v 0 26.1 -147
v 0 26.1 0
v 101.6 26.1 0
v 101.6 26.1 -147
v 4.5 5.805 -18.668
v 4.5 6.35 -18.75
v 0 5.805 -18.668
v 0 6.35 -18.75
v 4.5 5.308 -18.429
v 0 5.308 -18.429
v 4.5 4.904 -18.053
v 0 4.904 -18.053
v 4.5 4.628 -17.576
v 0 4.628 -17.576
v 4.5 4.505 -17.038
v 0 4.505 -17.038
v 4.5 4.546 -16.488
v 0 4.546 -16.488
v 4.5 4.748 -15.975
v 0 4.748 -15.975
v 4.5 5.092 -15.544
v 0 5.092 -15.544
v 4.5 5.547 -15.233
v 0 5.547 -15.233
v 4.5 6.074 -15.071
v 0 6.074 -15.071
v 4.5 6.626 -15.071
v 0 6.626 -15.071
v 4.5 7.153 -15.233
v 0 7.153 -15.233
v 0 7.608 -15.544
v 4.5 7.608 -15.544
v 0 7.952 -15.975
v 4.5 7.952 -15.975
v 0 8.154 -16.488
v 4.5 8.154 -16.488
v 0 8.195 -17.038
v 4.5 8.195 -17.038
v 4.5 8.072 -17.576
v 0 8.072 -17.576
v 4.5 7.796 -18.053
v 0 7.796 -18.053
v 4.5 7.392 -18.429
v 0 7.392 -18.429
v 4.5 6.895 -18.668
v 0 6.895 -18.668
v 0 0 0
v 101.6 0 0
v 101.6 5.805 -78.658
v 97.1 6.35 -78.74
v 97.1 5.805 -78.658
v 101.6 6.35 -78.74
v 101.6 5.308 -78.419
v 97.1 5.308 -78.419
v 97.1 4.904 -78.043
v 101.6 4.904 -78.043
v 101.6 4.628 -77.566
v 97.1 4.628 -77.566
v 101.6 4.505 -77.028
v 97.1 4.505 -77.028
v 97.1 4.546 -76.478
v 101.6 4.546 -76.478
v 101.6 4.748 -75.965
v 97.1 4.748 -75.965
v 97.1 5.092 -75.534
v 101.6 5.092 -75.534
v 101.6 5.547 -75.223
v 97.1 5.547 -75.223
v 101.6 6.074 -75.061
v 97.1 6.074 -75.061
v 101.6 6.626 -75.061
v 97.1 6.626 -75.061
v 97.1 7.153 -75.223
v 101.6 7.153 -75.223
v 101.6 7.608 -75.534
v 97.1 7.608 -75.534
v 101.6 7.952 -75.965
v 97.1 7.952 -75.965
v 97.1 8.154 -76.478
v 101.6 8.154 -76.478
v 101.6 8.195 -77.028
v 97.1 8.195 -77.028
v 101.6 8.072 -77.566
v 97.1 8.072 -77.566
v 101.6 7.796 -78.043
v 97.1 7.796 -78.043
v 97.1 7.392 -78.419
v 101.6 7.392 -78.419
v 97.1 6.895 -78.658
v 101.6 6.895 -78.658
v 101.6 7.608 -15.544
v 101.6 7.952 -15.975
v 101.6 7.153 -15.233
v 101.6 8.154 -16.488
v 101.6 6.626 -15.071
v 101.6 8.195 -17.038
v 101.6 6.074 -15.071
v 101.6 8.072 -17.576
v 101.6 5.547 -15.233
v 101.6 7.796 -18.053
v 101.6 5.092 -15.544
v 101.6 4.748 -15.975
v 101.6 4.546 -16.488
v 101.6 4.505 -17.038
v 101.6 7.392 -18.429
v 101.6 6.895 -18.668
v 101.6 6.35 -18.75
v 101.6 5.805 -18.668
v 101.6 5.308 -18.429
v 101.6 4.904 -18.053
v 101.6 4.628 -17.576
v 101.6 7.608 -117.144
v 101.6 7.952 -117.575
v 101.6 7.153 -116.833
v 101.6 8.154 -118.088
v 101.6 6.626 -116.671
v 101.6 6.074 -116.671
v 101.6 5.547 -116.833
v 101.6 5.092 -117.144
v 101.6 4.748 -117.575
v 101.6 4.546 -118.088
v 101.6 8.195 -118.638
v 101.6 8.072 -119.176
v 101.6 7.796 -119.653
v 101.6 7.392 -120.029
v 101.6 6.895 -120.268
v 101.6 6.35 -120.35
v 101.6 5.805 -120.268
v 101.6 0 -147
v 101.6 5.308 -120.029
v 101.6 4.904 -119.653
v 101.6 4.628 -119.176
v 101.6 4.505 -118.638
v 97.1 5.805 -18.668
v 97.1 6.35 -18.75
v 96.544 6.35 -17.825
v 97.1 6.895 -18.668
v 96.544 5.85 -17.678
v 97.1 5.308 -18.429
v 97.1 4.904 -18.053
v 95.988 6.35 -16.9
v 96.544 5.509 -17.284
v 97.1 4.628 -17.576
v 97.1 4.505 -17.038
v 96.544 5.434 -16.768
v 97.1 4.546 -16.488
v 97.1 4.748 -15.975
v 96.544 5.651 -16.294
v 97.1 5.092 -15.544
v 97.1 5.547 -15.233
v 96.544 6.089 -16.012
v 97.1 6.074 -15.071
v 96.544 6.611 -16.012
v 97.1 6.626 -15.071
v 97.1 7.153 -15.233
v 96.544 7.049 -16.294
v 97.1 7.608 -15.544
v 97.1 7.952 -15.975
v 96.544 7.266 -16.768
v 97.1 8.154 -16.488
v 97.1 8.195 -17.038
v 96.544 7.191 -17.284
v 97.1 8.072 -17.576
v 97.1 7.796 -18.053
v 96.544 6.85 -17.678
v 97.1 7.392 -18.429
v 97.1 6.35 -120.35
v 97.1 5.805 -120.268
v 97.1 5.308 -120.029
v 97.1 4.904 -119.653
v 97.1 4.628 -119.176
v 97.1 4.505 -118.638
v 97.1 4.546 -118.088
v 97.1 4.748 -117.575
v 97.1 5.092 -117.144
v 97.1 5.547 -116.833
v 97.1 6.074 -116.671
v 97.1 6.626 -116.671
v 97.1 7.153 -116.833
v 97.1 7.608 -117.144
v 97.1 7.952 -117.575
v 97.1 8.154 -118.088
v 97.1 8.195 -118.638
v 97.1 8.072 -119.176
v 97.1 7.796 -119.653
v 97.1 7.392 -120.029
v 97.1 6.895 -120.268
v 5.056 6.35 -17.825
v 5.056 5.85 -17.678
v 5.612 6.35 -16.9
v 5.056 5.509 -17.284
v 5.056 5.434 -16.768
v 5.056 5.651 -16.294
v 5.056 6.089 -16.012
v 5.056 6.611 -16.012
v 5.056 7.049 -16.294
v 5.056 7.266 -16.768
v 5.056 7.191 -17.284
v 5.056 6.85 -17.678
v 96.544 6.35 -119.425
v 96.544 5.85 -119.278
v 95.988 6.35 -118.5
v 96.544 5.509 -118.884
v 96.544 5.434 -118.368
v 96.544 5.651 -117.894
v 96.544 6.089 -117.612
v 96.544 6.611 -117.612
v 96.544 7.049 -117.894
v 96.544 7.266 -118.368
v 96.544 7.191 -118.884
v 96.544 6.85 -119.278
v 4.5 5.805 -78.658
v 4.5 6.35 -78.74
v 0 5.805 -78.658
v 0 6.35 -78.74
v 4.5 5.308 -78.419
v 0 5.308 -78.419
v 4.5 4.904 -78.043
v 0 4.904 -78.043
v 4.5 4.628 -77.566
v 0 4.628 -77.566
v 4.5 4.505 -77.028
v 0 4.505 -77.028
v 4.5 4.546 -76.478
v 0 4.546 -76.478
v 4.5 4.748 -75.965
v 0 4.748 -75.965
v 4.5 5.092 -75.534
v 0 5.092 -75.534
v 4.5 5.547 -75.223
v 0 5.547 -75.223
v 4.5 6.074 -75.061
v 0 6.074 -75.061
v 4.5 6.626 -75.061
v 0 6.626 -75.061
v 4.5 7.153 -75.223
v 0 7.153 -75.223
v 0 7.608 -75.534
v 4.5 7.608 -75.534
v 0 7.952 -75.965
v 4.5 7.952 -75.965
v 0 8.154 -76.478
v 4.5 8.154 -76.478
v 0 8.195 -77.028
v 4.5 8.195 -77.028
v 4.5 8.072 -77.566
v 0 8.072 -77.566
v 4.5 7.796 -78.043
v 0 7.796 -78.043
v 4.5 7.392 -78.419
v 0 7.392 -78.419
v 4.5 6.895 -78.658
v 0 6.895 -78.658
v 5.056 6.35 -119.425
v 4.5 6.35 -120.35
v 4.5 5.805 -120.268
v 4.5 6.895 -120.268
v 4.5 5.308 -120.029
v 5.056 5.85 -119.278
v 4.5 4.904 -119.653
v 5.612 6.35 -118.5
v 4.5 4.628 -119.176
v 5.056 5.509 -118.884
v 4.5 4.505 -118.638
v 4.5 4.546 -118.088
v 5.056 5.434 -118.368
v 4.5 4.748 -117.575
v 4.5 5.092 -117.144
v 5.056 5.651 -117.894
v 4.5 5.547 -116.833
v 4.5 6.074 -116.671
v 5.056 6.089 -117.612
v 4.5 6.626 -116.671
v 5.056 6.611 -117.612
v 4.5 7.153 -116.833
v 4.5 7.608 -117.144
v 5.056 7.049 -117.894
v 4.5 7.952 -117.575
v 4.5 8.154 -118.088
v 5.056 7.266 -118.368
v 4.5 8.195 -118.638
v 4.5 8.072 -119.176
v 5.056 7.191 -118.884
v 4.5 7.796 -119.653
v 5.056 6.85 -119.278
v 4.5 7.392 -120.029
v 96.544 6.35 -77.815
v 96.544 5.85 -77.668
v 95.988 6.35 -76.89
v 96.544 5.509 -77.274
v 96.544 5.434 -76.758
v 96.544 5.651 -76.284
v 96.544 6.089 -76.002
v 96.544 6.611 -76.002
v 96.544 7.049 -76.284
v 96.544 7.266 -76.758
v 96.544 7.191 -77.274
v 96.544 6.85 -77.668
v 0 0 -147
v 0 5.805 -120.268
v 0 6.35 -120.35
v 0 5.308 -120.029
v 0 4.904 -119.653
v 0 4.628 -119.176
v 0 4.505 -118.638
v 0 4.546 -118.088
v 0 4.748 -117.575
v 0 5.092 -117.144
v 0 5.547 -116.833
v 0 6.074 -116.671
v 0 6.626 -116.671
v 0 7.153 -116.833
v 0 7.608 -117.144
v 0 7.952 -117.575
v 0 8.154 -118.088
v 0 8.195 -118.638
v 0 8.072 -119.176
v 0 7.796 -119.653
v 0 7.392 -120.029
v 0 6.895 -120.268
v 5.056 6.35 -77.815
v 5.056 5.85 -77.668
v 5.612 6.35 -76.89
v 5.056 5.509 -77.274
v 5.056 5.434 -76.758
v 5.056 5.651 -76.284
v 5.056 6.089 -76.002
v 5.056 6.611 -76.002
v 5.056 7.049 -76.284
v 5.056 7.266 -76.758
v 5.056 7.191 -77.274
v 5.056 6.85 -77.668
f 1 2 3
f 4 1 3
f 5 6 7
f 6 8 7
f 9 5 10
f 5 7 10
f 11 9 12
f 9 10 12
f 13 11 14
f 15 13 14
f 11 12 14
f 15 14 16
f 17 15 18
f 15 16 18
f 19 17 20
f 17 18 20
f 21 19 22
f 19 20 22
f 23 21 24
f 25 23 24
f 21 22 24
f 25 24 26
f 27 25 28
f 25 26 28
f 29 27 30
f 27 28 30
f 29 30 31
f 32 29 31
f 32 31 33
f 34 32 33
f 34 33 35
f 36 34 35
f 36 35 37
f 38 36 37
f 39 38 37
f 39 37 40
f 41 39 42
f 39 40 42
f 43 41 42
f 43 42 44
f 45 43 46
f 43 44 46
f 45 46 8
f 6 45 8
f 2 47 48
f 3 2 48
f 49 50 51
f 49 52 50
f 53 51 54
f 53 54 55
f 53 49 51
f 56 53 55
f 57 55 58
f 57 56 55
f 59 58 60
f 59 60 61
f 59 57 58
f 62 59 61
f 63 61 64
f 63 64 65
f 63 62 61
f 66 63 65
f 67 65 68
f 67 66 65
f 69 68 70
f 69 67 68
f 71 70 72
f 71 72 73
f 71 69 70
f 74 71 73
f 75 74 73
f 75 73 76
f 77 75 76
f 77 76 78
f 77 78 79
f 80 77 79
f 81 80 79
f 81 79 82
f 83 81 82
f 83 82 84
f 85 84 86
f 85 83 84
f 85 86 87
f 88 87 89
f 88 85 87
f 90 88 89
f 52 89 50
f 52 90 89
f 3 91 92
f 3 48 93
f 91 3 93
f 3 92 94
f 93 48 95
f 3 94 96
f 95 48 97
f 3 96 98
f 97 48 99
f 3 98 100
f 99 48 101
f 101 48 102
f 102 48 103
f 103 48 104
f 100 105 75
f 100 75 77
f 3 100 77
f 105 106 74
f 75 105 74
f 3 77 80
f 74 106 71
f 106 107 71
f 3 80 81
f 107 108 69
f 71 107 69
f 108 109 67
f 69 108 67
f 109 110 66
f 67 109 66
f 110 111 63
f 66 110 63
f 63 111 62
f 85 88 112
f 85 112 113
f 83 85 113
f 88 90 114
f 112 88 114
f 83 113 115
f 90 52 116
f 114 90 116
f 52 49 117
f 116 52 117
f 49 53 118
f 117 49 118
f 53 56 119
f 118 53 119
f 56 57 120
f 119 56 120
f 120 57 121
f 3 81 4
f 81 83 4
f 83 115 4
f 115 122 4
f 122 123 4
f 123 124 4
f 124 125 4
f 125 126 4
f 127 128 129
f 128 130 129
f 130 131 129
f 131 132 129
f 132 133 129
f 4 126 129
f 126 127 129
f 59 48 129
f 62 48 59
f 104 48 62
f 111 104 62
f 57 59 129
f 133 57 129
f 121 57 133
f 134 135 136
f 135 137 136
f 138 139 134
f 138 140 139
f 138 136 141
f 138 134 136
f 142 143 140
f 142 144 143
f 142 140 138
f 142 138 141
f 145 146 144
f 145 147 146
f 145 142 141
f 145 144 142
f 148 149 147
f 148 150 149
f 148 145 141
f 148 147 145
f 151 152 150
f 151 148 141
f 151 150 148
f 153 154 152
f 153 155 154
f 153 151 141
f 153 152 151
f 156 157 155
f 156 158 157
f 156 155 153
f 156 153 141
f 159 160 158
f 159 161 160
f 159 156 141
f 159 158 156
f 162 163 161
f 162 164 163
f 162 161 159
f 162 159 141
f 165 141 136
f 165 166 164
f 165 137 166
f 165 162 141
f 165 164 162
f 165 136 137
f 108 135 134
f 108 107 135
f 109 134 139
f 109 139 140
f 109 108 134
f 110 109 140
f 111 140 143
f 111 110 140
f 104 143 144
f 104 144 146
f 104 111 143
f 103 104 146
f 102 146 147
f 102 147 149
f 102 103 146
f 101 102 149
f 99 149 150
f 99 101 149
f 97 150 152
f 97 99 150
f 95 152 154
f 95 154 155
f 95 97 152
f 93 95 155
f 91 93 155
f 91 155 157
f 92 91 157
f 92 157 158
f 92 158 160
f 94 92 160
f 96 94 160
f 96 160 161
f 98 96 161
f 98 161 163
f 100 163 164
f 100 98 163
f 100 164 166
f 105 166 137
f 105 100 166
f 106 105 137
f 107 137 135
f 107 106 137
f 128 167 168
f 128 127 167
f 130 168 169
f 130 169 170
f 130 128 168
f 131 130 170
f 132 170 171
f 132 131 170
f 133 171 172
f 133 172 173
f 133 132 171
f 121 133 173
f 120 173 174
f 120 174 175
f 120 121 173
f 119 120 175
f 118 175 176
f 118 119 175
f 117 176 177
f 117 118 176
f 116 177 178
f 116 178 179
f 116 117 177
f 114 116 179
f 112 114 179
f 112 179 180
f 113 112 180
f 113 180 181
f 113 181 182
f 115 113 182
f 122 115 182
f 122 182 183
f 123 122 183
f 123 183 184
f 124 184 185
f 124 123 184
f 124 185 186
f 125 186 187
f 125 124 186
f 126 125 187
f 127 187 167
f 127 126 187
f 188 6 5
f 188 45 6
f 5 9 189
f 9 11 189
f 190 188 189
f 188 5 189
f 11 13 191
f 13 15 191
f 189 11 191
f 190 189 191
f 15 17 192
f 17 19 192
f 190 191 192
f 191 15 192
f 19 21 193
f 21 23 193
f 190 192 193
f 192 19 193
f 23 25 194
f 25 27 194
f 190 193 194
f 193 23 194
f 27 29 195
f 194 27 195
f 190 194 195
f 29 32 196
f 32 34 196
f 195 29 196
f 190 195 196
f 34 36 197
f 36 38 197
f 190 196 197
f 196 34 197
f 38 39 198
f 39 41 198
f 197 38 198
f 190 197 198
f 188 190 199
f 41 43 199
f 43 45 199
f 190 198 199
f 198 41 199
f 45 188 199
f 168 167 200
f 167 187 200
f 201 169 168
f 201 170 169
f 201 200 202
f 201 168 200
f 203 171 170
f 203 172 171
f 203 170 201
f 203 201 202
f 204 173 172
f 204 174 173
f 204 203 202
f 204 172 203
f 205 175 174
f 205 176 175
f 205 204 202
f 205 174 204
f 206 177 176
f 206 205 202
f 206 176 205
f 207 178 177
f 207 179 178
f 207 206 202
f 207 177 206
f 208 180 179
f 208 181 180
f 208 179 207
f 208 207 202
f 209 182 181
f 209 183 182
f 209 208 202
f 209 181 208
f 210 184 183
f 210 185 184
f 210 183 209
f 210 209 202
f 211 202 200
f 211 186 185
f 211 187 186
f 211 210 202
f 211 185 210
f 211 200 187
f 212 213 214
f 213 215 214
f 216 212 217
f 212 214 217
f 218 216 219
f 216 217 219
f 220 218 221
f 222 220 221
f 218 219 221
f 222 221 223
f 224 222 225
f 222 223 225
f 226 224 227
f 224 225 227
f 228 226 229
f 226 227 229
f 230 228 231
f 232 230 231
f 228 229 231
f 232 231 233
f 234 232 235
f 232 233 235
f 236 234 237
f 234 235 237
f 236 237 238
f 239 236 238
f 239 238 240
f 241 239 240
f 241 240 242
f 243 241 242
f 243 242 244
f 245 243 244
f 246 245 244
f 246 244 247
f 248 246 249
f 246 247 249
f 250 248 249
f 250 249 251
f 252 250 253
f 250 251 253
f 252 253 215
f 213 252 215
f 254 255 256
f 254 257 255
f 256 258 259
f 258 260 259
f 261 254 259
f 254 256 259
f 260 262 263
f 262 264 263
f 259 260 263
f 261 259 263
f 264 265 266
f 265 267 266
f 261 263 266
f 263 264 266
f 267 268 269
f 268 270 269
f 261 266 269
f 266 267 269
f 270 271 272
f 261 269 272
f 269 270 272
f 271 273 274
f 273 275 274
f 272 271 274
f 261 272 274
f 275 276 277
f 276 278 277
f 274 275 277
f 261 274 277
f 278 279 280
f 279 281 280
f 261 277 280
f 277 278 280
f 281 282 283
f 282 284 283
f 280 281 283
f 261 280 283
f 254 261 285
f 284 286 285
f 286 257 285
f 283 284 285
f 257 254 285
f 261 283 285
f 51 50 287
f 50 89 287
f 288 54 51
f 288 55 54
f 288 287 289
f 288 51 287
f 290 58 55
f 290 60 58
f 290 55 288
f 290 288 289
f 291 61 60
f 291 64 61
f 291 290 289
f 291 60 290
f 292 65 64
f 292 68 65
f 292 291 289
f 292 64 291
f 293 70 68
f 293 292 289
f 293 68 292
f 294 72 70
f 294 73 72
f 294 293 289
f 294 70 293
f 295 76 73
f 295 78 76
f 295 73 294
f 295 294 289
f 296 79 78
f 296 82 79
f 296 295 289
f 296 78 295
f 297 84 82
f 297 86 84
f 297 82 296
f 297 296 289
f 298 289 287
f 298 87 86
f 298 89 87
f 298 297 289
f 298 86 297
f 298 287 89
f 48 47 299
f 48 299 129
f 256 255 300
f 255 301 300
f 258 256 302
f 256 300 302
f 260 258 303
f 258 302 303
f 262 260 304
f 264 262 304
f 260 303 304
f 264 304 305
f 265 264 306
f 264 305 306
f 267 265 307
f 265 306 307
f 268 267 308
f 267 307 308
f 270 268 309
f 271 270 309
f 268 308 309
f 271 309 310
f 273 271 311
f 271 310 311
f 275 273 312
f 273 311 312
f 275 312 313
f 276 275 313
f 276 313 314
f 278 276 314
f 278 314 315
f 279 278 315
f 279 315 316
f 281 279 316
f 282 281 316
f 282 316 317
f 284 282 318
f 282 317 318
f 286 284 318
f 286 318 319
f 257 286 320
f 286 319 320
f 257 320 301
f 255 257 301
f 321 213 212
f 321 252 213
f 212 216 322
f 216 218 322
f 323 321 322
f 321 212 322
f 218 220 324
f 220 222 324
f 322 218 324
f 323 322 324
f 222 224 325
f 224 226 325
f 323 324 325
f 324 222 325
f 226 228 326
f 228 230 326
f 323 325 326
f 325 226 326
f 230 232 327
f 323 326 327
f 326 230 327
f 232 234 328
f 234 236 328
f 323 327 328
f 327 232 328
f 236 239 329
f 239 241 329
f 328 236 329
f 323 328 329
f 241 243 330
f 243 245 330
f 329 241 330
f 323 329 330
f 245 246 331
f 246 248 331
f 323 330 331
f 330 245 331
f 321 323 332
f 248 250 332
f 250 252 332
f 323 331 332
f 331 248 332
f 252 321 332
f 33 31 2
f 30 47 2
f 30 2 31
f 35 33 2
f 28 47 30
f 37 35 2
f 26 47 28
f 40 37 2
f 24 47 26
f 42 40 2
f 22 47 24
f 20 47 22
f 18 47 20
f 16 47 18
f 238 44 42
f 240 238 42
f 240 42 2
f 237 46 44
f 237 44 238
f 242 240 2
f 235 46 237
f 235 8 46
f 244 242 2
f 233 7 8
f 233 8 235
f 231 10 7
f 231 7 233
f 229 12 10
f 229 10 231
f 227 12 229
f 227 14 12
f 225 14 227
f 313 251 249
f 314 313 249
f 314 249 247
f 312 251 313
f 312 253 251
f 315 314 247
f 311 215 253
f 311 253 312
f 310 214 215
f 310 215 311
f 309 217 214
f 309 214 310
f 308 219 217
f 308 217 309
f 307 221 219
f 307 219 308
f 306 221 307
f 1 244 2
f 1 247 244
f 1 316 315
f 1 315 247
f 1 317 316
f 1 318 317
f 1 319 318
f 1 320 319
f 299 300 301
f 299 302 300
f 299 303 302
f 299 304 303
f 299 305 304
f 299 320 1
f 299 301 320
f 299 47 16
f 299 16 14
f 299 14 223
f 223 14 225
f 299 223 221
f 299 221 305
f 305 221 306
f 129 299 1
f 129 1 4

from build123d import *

# Parameters (mm, degrees)
SKETCH_1_W                   = 101.6
SKETCH_1_H                   = 147
EXTRUDE_1_DEPTH              = 26.1
HOLE_WIZARD_M3_51_AT_2_COUNT = 2
HOLE_WIZARD_M3_51_AT_2_PITCH = 59.99
HOLE_WIZARD_M3_51_AT_3_COUNT = 2
HOLE_WIZARD_M3_51_AT_3_PITCH = 101.6


with BuildPart() as part:
    # Эскиз1 → Бобышка-Вытянуть1 (new body)
    with BuildSketch(Plane(origin=(0, 0, 0), x_dir=(1, 0, 0), z_dir=(0, 1, 0))):
        with Locations((50.8, 73.5)):
            Rectangle(SKETCH_1_W, SKETCH_1_H)
    extrude(amount=EXTRUDE_1_DEPTH)

    # Эскиз5 → Сверло под метчик  спиральное M3.51 (revolve, cut)
    with BuildSketch(Plane(origin=(101.6, 6.35, -16.9), x_dir=(0, 0, -1), z_dir=(0, 1, 0))):
        Polygon((0, 0), (0, 5.611592145), (1.85, 4.5), (1.85, 0), align=None)
    hole_wizard_m3_51 = revolve(axis=Axis((107.95, 6.35, -16.9), (-1, 0, 0)), mode=Mode.SUBTRACT)

    # Сверло под метчик  спиральное M3.51 at 2: Сверло под метчик  спиральное M3.51 ×2
    with Locations(*[(0, 0, -i * HOLE_WIZARD_M3_51_AT_2_PITCH) for i in range(1, HOLE_WIZARD_M3_51_AT_2_COUNT)]):
        add(hole_wizard_m3_51, mode=Mode.SUBTRACT)

    # Сверло под метчик  спиральное M3.51 at 3: Сверло под метчик  спиральное M3.51 ×2
    with Locations(*[(0, 0, -i * HOLE_WIZARD_M3_51_AT_3_PITCH) for i in range(1, HOLE_WIZARD_M3_51_AT_3_COUNT)]):
        add(hole_wizard_m3_51, mode=Mode.SUBTRACT)

    # Зеркальное отражение1: Сверло под метчик  спиральное M3.51 across plane
    add(hole_wizard_m3_51.mirror(Plane.ZY.offset(-50.8)), mode=Mode.SUBTRACT)

    # Зеркальное отражение1 copy 1 sketch → Зеркальное отражение1 copy 1 (revolve, cut)
    with BuildSketch(Plane(origin=(0, 6.35, -76.89), x_dir=(0, 0, -1), z_dir=(0, 1, 0))):
        Polygon((0, 0), (0, -5.611592145), (1.85, -4.5), (1.85, 0), align=None)
    revolve(axis=Axis((-6.35, 6.35, -76.89), (-1, 0, 0)), mode=Mode.SUBTRACT)

    # Зеркальное отражение1 copy 2 sketch → Зеркальное отражение1 copy 2 (revolve, cut)
    with BuildSketch(Plane(origin=(0, 6.35, -118.5), x_dir=(0, 0, -1), z_dir=(0, 1, 0))):
        Polygon((0, 0), (0, -5.611592145), (1.85, -4.5), (1.85, 0), align=None)
    revolve(axis=Axis((-6.35, 6.35, -118.5), (-1, 0, 0)), mode=Mode.SUBTRACT)


solid = part.part
